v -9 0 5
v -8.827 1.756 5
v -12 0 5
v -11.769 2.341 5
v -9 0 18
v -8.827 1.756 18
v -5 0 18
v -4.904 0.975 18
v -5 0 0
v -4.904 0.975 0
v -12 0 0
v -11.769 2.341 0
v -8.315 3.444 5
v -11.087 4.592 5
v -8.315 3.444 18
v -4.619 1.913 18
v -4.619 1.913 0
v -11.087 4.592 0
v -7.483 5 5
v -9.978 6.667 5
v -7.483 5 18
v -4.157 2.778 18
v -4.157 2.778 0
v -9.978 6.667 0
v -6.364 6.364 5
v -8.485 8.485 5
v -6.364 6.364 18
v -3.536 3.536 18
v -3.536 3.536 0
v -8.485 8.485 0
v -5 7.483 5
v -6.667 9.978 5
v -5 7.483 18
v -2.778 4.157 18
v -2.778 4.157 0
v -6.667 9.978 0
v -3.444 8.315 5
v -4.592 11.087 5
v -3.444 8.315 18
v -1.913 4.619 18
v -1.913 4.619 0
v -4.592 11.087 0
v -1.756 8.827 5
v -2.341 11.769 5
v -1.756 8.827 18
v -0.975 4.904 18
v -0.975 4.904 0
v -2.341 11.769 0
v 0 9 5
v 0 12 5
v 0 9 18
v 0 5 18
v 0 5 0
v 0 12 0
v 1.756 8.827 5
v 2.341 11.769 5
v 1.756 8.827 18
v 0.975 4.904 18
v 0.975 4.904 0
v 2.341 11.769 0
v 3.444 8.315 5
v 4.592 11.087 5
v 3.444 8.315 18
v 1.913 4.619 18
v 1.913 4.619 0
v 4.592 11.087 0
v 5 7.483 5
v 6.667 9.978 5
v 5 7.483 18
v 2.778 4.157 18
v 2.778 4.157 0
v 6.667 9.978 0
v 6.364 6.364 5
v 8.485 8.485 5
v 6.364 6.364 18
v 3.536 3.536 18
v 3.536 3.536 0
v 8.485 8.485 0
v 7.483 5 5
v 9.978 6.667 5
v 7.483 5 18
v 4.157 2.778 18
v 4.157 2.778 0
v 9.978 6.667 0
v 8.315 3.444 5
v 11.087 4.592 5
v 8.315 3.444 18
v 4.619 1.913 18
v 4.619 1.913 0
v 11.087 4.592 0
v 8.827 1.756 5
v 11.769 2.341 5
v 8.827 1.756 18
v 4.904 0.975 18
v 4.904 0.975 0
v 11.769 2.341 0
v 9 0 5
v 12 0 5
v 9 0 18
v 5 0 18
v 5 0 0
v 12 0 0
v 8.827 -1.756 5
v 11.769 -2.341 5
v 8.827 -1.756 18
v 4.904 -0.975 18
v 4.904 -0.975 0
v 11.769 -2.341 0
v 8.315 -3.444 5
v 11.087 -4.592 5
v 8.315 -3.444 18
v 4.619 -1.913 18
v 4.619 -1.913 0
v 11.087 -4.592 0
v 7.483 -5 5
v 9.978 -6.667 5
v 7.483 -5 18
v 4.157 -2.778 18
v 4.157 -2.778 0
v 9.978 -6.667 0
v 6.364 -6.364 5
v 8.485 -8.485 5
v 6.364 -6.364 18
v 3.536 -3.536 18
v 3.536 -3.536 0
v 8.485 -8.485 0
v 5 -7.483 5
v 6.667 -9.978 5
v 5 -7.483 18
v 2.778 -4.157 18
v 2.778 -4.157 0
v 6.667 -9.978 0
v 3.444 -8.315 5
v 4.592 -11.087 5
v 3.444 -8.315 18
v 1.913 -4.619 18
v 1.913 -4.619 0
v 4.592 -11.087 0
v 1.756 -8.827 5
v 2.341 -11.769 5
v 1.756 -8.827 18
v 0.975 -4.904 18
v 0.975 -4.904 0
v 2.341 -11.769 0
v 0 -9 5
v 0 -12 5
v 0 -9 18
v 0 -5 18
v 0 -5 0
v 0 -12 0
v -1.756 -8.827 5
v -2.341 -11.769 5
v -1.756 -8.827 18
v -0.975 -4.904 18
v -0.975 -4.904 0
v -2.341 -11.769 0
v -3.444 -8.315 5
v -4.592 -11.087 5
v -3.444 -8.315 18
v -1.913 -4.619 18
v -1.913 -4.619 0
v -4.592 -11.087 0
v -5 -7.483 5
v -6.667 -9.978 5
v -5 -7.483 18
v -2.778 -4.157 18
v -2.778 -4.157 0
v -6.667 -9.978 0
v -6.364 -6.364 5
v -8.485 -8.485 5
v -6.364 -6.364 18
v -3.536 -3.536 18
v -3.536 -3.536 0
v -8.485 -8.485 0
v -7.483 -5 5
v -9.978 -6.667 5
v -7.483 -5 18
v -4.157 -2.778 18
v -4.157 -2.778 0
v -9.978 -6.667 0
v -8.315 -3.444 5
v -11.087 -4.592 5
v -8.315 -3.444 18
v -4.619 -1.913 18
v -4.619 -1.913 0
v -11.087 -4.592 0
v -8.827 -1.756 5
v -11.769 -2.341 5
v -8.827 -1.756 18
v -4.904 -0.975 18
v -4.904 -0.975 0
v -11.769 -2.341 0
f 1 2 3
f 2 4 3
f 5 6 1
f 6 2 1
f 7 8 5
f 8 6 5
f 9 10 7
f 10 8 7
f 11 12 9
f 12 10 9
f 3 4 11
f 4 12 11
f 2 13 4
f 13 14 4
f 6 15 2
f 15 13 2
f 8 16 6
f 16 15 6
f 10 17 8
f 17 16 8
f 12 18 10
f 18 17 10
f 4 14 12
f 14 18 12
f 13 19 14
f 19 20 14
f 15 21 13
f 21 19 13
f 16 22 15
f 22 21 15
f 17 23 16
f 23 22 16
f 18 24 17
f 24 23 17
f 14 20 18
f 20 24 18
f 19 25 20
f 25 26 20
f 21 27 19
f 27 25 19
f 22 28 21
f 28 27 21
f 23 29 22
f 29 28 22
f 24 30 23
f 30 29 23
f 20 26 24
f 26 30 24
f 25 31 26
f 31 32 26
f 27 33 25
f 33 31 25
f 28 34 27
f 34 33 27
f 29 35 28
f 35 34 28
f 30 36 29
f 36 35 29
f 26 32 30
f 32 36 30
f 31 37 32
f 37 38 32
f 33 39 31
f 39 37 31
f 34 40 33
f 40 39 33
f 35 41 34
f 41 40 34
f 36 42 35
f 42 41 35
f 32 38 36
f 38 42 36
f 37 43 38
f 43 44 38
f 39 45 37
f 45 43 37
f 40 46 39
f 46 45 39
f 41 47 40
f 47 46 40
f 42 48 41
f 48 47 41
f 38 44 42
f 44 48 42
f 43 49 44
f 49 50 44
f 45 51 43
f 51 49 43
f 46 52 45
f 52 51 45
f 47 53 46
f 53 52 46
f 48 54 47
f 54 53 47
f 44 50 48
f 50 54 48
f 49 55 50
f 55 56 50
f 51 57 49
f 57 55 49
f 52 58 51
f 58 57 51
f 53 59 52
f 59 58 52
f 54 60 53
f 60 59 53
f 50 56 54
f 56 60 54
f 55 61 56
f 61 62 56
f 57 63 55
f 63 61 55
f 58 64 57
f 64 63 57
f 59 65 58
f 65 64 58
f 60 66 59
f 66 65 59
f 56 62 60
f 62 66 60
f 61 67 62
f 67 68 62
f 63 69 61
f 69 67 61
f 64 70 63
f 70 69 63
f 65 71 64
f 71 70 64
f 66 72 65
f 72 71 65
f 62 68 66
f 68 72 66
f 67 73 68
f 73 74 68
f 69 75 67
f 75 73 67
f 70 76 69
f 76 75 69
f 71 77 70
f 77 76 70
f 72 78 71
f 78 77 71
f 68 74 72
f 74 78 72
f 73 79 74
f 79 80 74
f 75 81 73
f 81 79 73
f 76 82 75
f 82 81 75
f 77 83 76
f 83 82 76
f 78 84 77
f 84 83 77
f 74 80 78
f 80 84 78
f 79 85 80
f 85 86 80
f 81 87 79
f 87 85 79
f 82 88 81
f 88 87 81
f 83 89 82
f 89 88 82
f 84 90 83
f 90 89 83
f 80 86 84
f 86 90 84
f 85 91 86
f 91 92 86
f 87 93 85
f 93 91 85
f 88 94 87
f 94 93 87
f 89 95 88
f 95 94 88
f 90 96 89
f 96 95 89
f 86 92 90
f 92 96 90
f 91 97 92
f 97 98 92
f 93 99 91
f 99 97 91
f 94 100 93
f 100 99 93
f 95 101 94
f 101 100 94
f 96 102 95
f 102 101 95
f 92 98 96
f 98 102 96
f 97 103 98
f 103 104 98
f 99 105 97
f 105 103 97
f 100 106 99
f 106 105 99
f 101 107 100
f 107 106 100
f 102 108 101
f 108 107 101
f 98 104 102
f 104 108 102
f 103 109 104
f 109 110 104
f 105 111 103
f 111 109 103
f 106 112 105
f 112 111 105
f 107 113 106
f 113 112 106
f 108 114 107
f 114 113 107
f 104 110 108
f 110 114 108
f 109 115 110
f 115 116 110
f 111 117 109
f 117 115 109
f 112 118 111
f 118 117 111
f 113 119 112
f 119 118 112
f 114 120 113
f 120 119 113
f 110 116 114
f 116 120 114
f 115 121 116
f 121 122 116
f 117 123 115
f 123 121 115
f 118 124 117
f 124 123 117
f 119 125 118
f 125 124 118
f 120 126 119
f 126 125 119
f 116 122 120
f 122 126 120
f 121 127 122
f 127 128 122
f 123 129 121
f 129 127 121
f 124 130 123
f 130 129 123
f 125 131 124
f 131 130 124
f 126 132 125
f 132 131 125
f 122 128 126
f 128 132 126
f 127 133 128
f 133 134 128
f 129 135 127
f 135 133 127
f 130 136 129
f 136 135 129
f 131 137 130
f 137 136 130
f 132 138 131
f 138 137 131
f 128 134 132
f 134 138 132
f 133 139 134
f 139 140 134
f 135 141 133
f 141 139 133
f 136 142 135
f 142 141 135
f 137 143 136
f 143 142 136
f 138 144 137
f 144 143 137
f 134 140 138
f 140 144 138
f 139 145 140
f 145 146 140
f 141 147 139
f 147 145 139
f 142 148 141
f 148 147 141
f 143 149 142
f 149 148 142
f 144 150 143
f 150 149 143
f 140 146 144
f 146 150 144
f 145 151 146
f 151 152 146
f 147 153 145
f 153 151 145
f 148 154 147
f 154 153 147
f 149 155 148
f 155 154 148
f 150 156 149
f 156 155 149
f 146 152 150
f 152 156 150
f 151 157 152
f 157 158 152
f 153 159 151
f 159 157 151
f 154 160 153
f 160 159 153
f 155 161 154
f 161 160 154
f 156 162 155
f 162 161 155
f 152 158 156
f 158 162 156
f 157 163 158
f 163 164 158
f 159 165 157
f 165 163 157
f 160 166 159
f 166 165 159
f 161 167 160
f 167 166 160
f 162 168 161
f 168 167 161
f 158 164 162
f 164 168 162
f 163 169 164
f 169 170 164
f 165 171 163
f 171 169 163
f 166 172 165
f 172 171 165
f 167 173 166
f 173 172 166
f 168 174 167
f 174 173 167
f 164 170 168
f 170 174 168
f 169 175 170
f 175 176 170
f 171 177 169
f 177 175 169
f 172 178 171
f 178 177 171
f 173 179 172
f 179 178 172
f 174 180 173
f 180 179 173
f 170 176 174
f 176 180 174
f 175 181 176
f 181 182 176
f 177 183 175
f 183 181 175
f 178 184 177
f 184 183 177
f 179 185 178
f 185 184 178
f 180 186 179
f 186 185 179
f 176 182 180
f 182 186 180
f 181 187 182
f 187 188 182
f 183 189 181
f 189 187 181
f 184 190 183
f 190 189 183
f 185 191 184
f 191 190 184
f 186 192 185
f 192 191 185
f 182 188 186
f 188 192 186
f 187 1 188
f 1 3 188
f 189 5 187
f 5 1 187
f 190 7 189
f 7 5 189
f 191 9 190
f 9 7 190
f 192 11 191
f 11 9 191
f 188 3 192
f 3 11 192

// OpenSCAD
$fn = 32;

// ----------------------------------------------------------------------
// Arc stop: collar, 18 mm thick
// ----------------------------------------------------------------------

// --- parameters (mm) ---
revolve_angle = 360;      // full turn around the Z axis
profile_points = 6;       // points of the closed outline

profile = [[5, 0], [12, 0], [12, 5], [9, 5], [9, 18], [5, 18]];  // single closed polygon, 6 points, counter clockwise

// --- the one profile operation ---
rotate_extrude(angle = revolve_angle) polygon(points = profile);
